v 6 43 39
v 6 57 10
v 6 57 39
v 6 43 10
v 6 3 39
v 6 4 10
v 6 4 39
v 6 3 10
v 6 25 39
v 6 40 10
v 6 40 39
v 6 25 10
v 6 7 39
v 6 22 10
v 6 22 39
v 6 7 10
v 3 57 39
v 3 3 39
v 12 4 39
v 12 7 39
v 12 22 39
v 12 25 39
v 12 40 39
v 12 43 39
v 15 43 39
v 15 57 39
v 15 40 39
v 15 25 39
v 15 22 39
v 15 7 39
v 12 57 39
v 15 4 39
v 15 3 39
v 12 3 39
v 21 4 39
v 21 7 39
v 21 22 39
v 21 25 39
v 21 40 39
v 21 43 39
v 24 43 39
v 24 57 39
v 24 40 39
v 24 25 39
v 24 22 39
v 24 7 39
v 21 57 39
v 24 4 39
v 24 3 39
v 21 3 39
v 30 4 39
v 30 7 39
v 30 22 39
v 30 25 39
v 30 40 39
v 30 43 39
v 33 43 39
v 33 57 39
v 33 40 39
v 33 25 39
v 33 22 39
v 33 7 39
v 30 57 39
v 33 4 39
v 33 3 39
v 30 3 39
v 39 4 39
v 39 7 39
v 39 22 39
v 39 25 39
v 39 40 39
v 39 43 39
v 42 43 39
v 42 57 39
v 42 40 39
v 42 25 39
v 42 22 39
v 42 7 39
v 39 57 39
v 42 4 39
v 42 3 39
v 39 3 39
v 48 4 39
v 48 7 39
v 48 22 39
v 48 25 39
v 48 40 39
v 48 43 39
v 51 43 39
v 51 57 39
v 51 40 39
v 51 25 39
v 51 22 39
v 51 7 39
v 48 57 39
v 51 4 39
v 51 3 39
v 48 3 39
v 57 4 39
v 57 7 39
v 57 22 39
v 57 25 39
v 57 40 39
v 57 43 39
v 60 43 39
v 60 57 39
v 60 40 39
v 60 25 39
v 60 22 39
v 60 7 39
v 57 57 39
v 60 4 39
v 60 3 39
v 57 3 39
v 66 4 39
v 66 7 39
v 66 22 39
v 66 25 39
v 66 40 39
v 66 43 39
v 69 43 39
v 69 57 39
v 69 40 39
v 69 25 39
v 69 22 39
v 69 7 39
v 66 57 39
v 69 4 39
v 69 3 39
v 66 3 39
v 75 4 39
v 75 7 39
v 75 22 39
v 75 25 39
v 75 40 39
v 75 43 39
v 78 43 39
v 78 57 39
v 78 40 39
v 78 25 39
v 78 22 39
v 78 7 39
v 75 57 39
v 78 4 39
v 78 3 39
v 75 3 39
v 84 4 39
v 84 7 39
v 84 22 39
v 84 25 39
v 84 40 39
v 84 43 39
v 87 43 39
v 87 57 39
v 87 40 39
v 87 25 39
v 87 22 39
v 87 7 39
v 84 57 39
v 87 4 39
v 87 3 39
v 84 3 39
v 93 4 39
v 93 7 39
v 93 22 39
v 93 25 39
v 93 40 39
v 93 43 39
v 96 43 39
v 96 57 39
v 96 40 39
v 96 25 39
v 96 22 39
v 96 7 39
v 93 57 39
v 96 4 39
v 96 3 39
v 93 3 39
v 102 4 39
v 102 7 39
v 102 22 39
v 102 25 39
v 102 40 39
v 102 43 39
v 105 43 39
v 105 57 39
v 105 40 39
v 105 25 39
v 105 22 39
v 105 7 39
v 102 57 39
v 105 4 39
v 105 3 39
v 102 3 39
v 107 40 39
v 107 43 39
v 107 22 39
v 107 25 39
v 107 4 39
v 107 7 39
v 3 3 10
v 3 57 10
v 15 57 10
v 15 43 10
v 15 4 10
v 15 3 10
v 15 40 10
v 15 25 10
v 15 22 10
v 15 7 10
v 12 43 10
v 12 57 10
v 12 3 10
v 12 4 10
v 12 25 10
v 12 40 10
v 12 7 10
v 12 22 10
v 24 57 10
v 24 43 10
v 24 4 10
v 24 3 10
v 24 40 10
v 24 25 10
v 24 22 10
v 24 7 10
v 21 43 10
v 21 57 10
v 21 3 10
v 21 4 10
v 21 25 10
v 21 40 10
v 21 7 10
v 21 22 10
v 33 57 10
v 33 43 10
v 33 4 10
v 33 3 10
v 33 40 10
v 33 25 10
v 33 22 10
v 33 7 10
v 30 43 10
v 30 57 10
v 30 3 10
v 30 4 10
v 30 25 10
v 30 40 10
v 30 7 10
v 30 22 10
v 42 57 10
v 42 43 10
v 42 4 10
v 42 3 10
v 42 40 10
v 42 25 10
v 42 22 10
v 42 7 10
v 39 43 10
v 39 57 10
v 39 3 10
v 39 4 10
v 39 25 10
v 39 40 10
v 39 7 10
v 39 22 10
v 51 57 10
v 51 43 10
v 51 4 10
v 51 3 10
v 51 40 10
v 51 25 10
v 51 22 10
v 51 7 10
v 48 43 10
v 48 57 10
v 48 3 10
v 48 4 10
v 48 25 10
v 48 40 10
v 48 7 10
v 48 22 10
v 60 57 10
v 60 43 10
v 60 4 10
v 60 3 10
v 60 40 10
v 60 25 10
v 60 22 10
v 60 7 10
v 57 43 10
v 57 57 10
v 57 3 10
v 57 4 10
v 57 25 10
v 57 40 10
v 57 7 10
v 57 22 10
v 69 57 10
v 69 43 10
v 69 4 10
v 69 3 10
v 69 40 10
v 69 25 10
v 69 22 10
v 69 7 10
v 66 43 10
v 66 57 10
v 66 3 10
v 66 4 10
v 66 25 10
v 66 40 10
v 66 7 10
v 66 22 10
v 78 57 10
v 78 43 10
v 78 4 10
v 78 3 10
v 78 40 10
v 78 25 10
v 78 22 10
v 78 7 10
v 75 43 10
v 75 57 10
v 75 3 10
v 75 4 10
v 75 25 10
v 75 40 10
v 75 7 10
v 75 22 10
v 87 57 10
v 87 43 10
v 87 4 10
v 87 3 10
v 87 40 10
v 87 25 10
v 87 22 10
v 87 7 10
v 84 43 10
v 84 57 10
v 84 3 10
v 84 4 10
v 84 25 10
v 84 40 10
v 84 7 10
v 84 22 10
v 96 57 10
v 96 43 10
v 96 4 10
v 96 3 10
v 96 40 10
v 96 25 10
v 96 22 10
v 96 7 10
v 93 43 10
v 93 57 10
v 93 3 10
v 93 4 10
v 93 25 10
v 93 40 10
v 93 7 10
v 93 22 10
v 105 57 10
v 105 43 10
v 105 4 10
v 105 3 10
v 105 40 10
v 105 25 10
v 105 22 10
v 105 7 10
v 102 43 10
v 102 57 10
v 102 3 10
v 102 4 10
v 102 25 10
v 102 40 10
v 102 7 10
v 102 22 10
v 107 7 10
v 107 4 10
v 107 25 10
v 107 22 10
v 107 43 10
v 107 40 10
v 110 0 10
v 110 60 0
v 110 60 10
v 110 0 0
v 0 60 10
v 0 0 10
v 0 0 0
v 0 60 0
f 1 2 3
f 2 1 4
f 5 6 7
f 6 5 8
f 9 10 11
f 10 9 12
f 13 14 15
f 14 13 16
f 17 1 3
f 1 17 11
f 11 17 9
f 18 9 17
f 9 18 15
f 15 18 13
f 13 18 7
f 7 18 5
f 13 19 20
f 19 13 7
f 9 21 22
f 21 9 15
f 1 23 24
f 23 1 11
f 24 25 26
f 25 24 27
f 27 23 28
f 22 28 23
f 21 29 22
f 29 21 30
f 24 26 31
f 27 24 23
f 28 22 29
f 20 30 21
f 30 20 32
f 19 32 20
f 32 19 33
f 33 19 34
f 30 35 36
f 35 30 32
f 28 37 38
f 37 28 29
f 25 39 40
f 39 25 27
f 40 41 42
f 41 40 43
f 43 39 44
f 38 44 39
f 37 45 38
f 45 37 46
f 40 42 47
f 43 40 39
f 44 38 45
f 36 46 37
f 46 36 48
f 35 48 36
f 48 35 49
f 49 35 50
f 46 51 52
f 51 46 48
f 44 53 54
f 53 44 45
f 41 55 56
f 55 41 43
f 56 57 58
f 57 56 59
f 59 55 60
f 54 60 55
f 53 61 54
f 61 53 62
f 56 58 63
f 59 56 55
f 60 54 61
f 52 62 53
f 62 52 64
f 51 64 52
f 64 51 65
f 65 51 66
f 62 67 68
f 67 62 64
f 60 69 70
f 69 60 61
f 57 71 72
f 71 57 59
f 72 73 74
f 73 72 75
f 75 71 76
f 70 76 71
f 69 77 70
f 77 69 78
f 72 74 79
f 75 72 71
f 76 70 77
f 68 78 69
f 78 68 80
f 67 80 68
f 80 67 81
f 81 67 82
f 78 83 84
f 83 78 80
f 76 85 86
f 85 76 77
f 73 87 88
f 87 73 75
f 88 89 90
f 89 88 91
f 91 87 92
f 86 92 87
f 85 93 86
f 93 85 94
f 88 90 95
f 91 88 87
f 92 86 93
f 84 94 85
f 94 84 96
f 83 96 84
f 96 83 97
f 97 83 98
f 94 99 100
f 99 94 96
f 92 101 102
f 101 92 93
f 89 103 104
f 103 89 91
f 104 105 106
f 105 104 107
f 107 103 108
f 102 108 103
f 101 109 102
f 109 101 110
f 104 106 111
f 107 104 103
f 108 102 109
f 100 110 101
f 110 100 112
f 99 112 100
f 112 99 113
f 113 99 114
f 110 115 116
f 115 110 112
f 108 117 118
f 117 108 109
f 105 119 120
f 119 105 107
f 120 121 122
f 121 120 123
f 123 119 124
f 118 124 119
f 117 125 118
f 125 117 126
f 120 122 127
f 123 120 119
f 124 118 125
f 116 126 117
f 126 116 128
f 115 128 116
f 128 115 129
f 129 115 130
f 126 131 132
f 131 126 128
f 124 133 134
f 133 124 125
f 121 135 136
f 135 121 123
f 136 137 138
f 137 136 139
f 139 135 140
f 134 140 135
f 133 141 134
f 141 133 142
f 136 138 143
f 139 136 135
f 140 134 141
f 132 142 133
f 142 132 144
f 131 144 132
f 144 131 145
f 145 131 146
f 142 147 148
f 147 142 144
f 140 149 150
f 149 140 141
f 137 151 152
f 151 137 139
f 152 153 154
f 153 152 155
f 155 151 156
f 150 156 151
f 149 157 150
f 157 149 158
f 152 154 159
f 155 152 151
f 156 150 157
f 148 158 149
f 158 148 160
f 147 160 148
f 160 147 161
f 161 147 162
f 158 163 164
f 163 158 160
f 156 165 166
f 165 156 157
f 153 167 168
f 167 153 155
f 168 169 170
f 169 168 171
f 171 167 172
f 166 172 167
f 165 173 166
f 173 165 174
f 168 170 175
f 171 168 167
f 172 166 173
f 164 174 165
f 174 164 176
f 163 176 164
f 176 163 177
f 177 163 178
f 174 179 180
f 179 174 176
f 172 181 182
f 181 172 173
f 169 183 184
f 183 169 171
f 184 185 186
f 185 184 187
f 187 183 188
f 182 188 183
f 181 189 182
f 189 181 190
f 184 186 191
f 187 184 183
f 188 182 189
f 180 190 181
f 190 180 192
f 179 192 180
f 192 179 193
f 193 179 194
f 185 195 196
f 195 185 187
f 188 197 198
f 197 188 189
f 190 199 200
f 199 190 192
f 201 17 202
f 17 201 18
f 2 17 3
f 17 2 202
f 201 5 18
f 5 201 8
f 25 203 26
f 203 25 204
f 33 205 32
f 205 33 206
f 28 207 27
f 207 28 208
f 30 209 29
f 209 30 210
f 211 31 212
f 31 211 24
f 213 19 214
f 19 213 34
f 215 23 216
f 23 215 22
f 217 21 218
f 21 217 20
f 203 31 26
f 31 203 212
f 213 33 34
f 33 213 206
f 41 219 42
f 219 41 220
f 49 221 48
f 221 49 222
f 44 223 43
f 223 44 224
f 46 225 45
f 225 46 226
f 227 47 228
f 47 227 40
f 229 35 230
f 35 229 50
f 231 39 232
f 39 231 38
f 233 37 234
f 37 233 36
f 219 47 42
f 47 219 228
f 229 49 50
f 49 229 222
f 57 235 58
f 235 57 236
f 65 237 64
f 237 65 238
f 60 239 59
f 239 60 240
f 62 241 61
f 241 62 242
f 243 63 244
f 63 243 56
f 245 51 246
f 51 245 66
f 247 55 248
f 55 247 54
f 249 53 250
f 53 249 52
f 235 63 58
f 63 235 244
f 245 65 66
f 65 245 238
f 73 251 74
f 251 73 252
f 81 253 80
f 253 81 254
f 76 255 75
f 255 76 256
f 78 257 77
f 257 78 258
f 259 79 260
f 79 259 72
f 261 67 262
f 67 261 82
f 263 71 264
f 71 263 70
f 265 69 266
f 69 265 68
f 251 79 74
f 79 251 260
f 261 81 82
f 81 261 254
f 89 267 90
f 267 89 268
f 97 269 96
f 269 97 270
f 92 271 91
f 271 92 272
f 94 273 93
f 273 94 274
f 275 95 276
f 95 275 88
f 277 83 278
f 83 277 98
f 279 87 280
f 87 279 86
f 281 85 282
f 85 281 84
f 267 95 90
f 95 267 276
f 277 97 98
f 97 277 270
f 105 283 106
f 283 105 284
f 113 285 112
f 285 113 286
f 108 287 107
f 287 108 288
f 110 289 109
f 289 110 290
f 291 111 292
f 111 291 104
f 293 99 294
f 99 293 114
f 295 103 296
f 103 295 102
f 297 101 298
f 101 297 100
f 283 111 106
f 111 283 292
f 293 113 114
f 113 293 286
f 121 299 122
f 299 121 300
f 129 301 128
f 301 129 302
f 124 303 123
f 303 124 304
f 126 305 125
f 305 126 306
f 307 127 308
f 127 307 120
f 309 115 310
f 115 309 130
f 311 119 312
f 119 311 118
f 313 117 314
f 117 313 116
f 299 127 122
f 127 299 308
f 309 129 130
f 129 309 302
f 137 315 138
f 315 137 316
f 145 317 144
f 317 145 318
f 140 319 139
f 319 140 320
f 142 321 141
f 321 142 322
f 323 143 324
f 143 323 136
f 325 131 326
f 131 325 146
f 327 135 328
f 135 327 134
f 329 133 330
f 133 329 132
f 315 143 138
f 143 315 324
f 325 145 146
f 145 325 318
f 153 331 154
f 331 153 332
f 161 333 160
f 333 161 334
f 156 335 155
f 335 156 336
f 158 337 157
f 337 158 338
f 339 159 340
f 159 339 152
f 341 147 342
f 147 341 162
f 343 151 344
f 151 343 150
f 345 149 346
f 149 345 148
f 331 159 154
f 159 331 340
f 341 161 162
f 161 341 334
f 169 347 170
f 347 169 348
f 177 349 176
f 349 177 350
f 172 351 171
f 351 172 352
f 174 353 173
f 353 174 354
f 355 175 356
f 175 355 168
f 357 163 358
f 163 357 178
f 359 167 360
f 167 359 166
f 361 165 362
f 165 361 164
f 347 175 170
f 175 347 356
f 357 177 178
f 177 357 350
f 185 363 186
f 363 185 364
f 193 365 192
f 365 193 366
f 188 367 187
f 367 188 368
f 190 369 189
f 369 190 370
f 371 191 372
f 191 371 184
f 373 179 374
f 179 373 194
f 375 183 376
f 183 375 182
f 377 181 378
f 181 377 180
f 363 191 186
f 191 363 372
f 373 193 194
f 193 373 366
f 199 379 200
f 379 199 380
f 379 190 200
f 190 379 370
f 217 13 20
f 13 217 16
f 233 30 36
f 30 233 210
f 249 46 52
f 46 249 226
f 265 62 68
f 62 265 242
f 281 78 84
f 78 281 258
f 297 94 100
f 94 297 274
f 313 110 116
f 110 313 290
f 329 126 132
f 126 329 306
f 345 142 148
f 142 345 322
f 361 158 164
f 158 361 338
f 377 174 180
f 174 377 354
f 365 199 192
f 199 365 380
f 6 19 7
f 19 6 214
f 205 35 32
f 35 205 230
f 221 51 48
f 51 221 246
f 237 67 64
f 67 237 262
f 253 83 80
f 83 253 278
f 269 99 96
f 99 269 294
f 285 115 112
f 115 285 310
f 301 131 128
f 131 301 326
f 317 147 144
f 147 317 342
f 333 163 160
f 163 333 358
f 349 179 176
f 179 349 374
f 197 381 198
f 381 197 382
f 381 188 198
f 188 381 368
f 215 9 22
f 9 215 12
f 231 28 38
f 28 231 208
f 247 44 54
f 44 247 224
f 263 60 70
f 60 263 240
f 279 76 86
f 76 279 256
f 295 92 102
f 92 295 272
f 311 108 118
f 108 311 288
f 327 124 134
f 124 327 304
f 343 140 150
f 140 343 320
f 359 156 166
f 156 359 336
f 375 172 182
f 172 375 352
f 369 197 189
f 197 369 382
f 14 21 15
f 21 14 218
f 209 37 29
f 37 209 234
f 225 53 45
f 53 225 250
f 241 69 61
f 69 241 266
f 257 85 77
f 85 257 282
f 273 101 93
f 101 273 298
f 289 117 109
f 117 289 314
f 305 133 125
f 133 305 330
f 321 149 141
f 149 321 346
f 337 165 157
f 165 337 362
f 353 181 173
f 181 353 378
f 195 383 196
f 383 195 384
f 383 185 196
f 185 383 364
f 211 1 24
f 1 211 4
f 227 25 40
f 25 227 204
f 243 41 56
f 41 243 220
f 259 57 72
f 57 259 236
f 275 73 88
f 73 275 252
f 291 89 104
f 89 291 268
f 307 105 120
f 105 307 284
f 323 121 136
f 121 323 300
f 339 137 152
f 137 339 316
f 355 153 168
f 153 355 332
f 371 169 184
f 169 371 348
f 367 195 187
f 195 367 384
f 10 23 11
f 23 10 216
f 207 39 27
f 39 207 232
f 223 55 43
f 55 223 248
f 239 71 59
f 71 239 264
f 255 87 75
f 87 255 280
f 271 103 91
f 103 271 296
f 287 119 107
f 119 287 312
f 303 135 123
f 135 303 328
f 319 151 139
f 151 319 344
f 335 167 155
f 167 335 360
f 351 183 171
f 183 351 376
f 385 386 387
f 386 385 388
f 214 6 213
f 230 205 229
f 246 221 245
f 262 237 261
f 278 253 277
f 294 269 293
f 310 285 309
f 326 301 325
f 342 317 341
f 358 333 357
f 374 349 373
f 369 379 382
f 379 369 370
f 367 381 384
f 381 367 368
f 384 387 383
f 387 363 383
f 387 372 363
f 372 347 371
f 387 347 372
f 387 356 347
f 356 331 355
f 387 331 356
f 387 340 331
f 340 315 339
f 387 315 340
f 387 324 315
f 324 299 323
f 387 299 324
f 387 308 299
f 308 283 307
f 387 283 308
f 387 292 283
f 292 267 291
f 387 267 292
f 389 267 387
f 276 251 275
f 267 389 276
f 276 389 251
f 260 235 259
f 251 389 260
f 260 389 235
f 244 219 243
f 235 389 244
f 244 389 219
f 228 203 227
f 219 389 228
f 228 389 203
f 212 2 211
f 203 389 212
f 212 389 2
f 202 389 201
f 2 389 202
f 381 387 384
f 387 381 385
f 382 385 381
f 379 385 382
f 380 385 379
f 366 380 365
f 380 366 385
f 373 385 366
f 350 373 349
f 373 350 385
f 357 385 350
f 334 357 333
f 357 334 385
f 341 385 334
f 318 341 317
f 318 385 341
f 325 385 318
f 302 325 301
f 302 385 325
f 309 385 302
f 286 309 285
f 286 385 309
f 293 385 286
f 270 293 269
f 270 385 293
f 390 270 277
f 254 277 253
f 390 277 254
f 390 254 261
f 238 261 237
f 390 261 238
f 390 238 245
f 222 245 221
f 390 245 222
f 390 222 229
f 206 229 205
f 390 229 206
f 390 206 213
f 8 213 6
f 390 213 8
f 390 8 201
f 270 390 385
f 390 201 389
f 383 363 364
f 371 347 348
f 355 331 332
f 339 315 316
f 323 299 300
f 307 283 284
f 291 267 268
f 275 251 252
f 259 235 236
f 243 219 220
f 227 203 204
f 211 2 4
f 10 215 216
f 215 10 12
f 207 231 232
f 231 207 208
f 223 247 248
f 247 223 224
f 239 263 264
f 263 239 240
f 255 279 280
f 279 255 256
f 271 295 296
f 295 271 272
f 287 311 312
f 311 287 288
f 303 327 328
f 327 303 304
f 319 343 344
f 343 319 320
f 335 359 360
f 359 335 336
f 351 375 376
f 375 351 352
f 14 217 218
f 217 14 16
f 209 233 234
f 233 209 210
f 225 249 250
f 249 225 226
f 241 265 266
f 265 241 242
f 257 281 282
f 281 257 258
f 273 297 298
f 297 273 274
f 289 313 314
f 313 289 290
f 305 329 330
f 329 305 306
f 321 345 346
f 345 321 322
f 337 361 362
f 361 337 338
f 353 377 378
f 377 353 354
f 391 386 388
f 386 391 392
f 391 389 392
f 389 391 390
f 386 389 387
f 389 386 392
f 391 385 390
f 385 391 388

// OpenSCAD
$fn = 32;

// ----------------------------------------------------------------------
// Heatsink: cross fin block
// ----------------------------------------------------------------------

// --- parameters (mm) ---
base_l = 110;             // base length, X
base_w = 60;              // base width, Y
base_t = 10;              // base plate thickness
fin_h = 30;               // fin height above the base
fin_t = 3;                // fin thickness
edge = 3;                 // margin from the base ends
pitch = 9;                // fin pitch
rib_pitch = 18;           // cross rib pitch
fit_tol = 0.05;           // tolerance for press fits, mm
free_tol = 0.3;           // tolerance for clearance fits, mm

n_fins = floor((base_l - 2 * edge - fin_t) / pitch) + 1;  // fin count
total_h = base_t + fin_h - 1;  // overall height
n_ribs = floor((base_w - 2 * edge) / rib_pitch);  // rib count

union() {
  cube([base_l, base_w, base_t]);
  for (i = [0 : n_fins - 1])
    translate([edge + i * pitch, edge, base_t - 1])
      cube([fin_t, base_w - 2 * edge, fin_h]);
  for (i = [0 : n_ribs - 1])
    translate([edge, edge + 1 + i * rib_pitch, base_t - 1])
      cube([base_l - 2 * edge, fin_t, fin_h]);
}
